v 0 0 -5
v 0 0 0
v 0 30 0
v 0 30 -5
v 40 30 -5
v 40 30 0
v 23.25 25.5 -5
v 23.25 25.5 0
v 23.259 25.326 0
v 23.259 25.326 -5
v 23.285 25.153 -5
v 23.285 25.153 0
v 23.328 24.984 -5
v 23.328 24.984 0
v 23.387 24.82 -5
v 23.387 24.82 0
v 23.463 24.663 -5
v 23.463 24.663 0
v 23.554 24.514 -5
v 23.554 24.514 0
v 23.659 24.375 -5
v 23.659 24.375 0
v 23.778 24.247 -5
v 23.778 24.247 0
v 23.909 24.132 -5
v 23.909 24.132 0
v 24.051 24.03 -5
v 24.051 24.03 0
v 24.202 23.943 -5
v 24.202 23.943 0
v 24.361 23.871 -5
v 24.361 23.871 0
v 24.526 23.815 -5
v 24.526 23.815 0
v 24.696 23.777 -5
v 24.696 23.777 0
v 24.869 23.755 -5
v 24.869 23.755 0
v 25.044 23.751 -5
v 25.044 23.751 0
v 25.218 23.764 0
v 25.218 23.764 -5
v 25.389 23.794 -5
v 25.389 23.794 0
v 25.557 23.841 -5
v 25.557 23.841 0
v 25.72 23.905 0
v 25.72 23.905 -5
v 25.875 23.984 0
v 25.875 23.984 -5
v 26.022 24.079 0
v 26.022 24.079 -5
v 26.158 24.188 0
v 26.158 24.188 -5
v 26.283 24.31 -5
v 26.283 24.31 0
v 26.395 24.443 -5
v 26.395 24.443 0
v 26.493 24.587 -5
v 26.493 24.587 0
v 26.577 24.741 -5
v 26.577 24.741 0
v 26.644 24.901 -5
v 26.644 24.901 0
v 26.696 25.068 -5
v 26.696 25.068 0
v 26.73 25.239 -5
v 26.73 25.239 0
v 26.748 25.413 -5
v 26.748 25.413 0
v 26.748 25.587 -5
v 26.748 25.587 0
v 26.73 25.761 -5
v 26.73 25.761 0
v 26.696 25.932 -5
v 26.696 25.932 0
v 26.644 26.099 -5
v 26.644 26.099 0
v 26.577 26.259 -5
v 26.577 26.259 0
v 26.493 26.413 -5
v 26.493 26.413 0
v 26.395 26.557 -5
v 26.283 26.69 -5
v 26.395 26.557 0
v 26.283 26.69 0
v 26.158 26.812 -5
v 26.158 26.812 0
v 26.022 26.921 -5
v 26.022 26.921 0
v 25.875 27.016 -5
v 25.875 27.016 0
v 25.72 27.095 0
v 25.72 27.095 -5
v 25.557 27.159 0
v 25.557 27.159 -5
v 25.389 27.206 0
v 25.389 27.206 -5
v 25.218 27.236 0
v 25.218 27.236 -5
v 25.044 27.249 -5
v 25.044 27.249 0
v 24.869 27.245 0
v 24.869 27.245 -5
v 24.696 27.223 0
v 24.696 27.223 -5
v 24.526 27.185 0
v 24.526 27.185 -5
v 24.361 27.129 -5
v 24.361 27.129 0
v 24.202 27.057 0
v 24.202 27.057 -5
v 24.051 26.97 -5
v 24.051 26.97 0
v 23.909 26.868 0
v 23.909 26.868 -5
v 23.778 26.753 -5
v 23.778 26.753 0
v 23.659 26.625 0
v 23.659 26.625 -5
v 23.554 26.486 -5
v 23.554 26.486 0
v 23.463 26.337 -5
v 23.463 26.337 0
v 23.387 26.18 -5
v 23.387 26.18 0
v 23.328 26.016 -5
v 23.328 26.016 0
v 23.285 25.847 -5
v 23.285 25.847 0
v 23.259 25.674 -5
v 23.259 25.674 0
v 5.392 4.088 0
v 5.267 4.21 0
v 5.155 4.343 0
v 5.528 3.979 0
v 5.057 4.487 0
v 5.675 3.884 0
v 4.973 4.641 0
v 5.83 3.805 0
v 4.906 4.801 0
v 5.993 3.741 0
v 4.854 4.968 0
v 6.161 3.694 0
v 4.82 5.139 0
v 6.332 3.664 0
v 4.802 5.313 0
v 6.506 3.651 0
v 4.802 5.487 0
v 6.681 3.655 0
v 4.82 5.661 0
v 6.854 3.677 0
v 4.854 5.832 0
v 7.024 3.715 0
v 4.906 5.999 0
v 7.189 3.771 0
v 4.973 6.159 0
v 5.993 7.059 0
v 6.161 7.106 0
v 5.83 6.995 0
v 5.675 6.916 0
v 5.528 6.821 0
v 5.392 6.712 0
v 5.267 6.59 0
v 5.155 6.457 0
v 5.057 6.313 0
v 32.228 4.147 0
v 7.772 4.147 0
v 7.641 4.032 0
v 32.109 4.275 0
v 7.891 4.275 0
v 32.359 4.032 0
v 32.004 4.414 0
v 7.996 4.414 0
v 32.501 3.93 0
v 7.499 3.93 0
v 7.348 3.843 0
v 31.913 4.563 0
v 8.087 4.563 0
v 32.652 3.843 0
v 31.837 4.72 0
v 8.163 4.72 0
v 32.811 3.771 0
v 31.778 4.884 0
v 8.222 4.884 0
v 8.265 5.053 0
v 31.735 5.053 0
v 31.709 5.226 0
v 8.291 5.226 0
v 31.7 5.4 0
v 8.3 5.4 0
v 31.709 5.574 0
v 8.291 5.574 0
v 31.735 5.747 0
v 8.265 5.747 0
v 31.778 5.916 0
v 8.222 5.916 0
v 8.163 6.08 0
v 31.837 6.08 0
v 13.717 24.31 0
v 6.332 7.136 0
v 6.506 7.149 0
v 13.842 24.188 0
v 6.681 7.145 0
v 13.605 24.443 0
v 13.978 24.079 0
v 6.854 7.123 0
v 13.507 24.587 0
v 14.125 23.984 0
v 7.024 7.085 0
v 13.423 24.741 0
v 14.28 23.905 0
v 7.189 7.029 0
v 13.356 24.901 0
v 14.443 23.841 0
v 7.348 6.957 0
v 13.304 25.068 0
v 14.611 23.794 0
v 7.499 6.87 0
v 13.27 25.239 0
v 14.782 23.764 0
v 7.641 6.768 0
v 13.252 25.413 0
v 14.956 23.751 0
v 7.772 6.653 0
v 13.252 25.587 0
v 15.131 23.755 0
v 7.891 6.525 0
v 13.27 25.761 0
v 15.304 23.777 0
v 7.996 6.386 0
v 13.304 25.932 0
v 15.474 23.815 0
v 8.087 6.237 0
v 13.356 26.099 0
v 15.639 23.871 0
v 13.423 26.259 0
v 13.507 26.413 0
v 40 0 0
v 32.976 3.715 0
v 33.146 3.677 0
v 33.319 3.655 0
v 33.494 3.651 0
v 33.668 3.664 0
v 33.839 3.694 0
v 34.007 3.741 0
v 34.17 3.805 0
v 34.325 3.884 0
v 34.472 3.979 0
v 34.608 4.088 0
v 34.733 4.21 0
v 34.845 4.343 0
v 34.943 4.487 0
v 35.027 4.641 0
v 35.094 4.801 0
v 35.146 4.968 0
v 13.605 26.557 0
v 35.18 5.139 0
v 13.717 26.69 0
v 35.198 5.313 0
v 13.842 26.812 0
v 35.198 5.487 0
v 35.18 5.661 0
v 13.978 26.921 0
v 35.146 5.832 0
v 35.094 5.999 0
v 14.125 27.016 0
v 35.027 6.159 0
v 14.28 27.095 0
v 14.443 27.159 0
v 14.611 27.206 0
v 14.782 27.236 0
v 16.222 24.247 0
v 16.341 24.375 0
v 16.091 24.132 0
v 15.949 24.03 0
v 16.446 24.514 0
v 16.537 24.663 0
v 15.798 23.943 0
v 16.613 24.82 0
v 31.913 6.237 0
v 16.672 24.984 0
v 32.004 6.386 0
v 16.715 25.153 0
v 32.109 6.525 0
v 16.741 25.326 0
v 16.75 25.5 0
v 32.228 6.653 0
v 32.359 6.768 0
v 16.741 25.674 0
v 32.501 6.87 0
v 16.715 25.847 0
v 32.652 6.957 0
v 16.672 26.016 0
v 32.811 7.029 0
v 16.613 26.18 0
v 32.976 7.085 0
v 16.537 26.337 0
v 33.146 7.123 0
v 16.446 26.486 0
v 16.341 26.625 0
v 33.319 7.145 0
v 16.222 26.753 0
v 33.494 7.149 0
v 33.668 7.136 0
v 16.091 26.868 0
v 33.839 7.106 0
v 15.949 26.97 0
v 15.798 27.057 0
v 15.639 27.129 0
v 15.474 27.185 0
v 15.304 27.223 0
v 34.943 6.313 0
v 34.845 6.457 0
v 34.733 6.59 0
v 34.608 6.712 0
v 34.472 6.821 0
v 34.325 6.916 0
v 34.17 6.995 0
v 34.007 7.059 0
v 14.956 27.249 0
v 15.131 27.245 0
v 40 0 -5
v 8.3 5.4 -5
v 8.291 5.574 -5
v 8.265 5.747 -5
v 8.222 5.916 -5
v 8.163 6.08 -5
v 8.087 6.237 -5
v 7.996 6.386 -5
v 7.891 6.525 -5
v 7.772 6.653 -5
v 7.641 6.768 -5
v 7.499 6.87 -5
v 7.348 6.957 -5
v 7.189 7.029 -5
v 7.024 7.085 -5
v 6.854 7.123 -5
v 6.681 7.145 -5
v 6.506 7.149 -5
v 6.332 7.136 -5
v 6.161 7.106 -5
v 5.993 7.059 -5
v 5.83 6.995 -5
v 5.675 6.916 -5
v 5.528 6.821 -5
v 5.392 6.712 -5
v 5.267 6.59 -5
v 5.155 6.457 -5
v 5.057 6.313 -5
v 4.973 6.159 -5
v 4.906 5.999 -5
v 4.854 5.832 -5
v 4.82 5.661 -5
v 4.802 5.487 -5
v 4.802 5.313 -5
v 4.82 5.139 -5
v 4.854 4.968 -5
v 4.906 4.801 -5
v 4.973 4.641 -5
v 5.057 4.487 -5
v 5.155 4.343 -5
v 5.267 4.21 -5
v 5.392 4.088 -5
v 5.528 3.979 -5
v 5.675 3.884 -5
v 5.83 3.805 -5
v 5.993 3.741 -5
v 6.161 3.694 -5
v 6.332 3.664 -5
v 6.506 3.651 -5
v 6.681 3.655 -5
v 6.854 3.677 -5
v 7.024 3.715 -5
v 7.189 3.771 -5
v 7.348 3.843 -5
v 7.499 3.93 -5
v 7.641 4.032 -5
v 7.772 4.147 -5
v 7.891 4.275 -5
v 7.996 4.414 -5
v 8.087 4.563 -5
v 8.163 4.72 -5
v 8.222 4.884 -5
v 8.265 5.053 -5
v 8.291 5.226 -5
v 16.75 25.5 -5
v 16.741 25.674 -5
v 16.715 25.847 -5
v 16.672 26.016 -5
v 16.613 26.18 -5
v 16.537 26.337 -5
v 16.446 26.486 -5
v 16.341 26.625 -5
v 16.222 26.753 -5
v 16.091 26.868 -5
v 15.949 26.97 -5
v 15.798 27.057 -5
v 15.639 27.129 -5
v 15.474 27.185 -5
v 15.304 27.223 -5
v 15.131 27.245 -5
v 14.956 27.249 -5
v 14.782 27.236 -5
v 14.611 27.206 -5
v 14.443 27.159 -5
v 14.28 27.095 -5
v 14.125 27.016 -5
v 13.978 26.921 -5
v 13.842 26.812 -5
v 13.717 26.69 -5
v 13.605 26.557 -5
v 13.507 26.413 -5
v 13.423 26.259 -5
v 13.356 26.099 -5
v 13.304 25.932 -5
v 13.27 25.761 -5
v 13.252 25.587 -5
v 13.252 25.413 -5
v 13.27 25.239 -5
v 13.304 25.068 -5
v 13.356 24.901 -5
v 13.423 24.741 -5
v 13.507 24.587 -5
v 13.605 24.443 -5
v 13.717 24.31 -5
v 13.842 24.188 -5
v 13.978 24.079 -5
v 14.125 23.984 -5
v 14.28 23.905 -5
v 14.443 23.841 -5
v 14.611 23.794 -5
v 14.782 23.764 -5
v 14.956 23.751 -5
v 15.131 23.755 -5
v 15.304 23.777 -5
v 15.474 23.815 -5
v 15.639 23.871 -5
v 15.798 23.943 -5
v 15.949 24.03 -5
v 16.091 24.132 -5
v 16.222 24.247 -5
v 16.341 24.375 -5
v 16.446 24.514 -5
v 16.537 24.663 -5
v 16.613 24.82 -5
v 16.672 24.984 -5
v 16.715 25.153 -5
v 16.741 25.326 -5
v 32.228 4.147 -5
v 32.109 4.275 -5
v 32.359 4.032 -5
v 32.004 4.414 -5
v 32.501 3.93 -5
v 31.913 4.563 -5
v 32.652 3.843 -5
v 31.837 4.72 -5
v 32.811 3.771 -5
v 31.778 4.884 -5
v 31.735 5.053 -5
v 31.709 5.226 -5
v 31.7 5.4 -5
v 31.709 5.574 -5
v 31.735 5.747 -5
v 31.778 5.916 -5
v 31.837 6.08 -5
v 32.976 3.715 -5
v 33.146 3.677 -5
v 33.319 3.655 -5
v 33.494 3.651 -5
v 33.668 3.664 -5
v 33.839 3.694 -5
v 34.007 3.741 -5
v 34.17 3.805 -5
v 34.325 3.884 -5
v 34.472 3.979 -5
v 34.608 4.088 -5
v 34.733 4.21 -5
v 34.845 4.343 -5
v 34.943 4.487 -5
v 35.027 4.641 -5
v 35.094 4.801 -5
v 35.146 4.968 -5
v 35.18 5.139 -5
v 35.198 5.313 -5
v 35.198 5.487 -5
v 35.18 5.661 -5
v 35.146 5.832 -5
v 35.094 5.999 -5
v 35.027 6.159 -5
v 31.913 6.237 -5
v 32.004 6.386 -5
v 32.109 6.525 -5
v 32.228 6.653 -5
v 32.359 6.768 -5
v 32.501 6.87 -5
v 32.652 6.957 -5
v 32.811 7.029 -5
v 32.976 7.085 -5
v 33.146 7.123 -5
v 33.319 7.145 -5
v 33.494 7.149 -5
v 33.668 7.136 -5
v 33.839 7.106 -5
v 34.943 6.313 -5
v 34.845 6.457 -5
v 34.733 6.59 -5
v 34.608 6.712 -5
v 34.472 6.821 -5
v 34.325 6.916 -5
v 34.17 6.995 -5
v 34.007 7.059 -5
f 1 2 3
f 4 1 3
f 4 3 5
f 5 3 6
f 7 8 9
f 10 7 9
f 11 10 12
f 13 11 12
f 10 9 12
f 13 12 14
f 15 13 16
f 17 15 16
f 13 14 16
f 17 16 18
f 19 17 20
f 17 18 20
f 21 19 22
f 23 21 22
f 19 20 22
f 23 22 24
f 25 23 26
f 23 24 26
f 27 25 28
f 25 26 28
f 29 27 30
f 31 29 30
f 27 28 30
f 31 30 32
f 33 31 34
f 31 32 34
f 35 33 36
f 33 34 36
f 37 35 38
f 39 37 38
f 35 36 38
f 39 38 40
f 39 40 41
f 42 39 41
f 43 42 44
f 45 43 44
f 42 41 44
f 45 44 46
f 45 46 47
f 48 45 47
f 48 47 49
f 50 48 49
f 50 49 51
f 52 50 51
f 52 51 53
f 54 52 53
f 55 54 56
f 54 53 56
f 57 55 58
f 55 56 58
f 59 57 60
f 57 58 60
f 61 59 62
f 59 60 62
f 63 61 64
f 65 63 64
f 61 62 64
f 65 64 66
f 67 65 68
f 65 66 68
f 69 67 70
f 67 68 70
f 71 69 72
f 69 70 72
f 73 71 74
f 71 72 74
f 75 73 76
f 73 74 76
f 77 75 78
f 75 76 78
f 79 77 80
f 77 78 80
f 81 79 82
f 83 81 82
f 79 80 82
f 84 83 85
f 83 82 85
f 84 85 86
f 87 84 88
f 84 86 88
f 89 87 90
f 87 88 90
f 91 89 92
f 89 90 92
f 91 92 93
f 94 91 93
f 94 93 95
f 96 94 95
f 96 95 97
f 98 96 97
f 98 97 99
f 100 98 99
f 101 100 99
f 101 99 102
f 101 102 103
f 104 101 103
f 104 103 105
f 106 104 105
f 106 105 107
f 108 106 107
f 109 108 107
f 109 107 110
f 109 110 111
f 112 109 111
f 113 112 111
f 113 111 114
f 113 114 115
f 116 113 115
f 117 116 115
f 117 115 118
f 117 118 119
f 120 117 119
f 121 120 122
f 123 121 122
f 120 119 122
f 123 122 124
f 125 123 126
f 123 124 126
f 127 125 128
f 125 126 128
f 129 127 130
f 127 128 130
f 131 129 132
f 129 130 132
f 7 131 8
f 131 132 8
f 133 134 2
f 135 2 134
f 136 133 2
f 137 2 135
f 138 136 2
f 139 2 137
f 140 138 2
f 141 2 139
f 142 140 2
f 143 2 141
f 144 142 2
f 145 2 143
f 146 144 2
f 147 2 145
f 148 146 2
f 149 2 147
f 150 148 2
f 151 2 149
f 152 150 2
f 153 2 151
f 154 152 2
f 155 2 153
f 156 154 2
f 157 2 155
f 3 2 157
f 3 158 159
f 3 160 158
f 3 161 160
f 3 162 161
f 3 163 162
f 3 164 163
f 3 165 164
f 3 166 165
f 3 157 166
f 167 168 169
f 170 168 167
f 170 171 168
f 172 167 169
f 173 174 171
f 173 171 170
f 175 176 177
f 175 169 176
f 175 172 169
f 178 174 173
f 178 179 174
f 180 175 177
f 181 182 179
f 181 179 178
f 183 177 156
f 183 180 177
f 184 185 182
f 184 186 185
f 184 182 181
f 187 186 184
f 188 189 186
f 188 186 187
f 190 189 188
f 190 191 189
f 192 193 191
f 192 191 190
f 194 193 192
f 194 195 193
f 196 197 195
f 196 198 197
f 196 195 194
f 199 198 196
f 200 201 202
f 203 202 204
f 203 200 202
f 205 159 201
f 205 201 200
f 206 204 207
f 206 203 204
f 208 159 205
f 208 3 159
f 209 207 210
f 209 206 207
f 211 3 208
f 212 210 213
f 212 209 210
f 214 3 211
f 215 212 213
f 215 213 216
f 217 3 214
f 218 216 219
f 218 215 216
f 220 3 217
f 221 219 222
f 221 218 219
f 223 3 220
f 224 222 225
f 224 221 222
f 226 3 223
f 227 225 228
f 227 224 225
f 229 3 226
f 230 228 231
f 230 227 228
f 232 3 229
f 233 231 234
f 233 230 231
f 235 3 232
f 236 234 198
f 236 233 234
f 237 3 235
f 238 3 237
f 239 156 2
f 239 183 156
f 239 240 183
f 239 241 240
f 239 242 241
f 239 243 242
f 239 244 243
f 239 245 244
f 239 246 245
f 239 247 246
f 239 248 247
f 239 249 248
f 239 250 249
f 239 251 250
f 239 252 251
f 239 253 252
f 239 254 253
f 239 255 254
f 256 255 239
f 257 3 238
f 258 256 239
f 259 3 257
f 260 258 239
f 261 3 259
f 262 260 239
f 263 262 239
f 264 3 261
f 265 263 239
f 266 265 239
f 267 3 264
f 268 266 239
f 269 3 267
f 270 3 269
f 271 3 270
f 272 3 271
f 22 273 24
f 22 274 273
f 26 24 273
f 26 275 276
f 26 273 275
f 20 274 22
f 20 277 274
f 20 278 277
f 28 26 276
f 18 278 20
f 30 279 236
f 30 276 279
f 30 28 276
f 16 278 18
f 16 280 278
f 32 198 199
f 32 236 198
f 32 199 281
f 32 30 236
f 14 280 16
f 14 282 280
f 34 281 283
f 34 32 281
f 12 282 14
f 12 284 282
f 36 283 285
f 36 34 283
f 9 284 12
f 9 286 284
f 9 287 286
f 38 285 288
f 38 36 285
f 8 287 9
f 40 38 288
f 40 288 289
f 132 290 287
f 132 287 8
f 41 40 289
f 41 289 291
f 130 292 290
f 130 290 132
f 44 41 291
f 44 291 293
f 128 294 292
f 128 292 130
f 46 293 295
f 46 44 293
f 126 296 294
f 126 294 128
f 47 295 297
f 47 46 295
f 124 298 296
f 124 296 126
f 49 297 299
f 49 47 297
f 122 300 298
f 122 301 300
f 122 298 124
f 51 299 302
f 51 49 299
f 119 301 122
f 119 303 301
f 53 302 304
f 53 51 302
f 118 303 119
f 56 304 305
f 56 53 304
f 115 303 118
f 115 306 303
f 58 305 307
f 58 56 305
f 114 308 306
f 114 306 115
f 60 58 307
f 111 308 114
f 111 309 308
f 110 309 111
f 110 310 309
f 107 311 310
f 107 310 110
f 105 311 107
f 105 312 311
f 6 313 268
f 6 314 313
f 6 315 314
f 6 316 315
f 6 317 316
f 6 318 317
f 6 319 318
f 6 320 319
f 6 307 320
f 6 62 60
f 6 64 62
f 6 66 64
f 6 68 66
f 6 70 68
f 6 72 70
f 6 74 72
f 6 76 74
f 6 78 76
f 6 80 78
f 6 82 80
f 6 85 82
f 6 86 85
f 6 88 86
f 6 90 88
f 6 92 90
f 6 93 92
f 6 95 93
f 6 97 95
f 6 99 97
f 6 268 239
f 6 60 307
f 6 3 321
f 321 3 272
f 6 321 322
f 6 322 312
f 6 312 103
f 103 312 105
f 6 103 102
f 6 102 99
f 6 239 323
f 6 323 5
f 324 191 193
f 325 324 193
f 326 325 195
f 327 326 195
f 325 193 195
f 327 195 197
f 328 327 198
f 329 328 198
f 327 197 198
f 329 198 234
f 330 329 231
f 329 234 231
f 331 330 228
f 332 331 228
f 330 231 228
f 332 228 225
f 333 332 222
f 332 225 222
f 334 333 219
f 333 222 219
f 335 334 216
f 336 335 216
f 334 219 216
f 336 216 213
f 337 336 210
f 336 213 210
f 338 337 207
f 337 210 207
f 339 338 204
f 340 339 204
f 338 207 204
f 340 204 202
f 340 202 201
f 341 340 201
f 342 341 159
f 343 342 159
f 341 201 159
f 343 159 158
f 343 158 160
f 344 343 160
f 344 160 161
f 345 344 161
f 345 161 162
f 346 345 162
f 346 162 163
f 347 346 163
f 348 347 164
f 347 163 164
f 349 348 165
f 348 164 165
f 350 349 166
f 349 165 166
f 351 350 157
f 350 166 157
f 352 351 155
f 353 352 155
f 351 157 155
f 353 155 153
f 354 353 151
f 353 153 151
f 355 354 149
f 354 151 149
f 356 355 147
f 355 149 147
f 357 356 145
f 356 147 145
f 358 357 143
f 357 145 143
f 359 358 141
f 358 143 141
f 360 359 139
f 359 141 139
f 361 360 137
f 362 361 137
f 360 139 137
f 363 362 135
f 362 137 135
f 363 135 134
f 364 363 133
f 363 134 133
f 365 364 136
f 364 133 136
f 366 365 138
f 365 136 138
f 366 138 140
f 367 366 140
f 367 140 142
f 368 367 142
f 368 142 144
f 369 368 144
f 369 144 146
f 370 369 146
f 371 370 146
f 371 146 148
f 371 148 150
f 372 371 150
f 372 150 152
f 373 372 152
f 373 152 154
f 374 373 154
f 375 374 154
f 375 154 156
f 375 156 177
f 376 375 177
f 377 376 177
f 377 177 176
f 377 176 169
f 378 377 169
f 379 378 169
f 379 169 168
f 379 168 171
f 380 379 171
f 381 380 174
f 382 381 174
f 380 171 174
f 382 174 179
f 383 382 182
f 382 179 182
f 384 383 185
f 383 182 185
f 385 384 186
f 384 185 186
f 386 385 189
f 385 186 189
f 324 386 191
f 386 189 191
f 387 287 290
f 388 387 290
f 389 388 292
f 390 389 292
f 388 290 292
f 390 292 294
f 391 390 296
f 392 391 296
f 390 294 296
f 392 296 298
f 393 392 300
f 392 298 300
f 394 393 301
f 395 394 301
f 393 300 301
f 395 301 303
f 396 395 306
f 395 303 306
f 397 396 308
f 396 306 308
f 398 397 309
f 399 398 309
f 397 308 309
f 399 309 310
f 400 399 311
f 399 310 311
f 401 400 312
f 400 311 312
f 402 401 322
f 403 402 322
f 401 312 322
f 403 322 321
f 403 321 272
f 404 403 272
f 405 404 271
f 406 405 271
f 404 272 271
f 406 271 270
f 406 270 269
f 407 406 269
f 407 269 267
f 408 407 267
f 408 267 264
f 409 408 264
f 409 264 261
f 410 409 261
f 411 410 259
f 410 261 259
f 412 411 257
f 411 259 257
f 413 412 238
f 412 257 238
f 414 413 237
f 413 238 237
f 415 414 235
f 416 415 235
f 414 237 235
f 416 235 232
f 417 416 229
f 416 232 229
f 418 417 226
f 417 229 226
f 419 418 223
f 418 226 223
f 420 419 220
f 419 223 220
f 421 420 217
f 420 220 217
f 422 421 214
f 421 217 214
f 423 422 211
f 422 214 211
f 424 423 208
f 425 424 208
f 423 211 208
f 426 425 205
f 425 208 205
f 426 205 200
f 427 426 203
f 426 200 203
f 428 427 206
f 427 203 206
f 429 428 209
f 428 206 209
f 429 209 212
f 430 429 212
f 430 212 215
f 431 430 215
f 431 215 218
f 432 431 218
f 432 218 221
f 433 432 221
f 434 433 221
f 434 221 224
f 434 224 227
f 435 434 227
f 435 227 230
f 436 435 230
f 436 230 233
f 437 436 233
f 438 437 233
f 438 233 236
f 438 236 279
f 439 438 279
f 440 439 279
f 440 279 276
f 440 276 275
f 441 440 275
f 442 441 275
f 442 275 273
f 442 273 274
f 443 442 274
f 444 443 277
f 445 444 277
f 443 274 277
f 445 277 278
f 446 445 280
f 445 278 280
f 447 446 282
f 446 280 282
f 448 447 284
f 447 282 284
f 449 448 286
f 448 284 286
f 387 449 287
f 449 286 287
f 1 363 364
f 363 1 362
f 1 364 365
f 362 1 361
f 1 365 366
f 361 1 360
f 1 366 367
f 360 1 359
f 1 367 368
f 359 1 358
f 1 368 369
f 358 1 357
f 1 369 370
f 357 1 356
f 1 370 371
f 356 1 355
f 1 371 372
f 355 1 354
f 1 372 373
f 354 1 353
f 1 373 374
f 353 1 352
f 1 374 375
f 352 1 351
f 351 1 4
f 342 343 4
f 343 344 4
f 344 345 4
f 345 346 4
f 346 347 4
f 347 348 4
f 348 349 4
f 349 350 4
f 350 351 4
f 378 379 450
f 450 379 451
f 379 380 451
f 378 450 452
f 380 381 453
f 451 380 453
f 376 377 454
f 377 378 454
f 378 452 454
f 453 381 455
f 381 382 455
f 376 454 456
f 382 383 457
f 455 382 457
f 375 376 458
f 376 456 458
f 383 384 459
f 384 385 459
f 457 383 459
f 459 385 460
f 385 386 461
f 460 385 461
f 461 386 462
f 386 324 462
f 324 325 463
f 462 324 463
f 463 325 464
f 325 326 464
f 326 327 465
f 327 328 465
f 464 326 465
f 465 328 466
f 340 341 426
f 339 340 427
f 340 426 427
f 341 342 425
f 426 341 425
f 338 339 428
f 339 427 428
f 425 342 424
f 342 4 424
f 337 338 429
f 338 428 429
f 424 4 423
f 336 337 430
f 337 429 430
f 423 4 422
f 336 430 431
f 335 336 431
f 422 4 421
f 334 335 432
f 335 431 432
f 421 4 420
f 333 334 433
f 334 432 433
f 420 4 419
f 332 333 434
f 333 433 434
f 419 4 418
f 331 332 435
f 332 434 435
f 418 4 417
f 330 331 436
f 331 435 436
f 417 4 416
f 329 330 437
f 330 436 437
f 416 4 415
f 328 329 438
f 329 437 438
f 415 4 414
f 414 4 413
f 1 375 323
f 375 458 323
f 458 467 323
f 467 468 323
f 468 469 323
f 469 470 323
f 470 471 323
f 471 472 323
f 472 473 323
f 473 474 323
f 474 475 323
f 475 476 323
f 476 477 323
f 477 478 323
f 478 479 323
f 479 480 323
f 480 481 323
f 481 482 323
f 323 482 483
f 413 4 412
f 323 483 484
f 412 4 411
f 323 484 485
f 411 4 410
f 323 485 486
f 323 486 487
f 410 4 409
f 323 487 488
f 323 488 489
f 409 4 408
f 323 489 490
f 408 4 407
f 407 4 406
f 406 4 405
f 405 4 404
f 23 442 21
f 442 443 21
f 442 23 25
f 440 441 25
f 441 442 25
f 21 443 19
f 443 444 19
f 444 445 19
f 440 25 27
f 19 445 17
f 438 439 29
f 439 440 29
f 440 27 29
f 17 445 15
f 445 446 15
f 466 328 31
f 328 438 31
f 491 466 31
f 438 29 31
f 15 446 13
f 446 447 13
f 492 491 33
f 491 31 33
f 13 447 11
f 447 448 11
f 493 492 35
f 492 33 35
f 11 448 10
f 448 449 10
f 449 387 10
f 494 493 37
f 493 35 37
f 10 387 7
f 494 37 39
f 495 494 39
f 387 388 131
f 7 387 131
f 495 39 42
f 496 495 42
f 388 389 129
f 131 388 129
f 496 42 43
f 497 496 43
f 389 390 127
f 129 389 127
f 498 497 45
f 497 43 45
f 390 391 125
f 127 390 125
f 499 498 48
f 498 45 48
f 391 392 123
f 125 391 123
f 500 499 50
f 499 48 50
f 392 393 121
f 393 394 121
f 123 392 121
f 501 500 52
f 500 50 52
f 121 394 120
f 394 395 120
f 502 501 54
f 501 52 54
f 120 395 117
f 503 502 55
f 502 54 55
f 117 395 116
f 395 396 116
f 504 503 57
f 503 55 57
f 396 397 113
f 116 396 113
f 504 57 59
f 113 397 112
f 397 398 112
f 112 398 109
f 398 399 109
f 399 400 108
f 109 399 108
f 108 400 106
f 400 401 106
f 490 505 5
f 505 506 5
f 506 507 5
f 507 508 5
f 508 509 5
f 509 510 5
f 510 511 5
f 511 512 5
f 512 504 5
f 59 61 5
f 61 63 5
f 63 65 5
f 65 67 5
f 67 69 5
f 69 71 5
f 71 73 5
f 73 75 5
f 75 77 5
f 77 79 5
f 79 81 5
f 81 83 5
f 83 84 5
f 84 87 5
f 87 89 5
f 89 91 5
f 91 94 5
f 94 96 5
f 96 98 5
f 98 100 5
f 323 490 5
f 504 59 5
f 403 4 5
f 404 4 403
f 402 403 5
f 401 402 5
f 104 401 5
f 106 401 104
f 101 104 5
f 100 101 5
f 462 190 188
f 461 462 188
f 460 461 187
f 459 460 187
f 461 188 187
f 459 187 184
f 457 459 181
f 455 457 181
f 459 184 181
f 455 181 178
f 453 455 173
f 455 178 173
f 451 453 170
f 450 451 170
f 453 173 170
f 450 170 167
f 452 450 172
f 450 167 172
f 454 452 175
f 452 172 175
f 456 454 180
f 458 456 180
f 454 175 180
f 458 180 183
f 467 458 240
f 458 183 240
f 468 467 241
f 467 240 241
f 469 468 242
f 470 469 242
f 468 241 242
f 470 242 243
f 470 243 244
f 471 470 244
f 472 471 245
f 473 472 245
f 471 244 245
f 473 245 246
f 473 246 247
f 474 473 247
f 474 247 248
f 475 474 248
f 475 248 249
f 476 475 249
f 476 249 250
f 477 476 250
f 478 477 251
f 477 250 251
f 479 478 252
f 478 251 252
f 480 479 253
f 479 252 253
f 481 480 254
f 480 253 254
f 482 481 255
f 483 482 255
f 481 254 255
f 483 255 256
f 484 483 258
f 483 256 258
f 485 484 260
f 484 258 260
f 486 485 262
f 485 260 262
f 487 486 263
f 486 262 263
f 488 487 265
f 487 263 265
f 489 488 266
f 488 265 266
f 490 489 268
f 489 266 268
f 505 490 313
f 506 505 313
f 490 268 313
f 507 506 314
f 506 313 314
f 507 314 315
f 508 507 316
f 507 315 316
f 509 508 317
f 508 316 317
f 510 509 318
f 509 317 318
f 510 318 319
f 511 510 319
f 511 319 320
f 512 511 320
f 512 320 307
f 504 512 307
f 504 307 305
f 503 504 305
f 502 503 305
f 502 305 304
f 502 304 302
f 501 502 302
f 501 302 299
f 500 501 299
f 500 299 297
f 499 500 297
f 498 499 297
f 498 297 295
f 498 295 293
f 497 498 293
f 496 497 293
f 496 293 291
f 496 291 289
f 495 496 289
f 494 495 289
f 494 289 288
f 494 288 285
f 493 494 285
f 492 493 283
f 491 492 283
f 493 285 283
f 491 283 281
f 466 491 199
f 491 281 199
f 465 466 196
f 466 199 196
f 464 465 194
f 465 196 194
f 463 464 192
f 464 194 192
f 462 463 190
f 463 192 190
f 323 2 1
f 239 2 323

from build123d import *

# Parameters (mm, degrees)
SKETCH1_W           = 40
SKETCH1_H           = 30
SKETCH1_R           = 1.75
BOSS_EXTRUDE1_DEPTH = 5


with BuildPart() as part:
    # Sketch1 → Boss-Extrude1 (new body)
    with BuildSketch(Plane.XY):
        with Locations((20, 15)):
            Rectangle(SKETCH1_W, SKETCH1_H)
        with Locations((15, 25.5)):
            Circle(SKETCH1_R, mode=Mode.SUBTRACT)
        with Locations(Location((25, 25.5, 0), (0, 0, 180))):
            Circle(SKETCH1_R, mode=Mode.SUBTRACT)
        with Locations((6.55, 5.4)):
            Circle(SKETCH1_R, mode=Mode.SUBTRACT)
        with Locations(Location((33.45, 5.4, 0), (0, 0, 180))):
            Circle(SKETCH1_R, mode=Mode.SUBTRACT)
    extrude(amount=-BOSS_EXTRUDE1_DEPTH)


solid = part.part
